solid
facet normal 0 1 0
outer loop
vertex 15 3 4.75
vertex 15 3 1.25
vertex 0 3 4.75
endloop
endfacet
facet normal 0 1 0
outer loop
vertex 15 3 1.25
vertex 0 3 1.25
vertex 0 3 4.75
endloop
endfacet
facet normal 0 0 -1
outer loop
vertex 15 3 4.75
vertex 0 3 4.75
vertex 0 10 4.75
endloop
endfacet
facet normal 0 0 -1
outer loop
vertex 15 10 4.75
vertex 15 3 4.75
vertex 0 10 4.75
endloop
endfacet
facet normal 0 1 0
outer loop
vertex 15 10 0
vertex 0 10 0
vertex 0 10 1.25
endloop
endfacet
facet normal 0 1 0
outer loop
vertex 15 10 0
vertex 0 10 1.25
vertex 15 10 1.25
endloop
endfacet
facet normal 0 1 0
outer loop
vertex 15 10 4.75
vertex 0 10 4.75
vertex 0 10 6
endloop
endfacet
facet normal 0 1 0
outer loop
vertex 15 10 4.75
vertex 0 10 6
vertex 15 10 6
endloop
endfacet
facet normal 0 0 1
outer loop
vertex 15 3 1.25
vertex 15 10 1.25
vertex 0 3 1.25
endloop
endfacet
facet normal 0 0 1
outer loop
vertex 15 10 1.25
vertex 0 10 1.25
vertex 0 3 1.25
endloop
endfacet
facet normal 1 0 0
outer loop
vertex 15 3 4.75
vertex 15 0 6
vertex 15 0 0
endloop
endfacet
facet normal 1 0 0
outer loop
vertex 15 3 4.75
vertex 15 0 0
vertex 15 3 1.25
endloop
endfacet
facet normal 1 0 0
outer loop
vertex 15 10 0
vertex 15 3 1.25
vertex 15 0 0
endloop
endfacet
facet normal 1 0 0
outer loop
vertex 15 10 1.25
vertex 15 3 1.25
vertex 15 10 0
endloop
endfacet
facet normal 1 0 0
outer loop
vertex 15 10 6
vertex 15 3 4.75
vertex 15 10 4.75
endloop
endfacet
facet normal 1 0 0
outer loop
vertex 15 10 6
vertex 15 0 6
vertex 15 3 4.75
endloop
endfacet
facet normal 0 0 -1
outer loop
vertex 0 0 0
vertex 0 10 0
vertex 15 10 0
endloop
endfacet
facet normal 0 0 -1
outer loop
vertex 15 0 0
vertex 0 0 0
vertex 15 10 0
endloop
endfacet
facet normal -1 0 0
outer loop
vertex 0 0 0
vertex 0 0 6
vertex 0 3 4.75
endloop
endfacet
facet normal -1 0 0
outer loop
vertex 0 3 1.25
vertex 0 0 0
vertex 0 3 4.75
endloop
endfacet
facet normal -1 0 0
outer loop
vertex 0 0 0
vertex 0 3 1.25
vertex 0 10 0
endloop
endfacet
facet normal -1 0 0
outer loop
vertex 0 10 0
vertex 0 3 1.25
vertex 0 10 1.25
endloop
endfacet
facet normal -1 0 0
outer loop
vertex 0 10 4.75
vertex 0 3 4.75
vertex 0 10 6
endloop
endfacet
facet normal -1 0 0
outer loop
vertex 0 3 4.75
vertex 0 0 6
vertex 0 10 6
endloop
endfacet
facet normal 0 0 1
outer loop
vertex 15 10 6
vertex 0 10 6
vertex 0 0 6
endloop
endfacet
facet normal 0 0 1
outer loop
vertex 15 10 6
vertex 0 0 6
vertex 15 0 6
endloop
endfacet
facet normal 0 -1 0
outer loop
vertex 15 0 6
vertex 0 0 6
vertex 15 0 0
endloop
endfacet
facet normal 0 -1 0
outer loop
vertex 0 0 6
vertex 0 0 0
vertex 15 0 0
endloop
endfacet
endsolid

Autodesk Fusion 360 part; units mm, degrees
box "BoxPrimitive1" add length 10 width 6 height 15 placed x (0, 1, 0) y (0, 0, 1) z (1, 0, 0) at (0, 0, 0)
sketch "Sketch3" plane through (0, 0, 0) normal (-1, 0, 0) x (0, 0, 1)
  line L0 (6, 10) -> (0, 10)
  line L1 (0, 10) -> (0, 0)
  line L2 (0, 0) -> (6, 0)
  line L3 (6, 0) -> (6, 10)
  line L4 (3, 10) -> (3, 6.5) construction
  line L5 (4.75, 10) -> (1.25, 10)
  line L6 (1.25, 10) -> (1.25, 3)
  line L7 (1.25, 3) -> (4.75, 3)
  line L8 (4.75, 3) -> (4.75, 10)
  line L9 (4.75, 10) -> (1.25, 3) construction
  line L10 (1.25, 10) -> (4.75, 3) construction
  point P0 (3, 6.5)
  dimension "d11" = 3.5
  dimension "d12" = 3.5
  dimension "d13" = 7
extrude "Extrude1" cut sketch "Sketch3" against normal blind 15 contours L0 L5 L6 L7 L8
equation "Hole = 3.5 mm"
equation "Width = 6 mm"
equation "Length = 15 mm"
equation "d4 = Height"
equation "d5 = Width"
equation "d6 = Length"
equation "Height = 10 mm"
equation "HHole = 7 mm"
equation "d11 = HHole / 2"
equation "d12 = Hole"
equation "d13 = HHole"
equation "d14 = -Length"
